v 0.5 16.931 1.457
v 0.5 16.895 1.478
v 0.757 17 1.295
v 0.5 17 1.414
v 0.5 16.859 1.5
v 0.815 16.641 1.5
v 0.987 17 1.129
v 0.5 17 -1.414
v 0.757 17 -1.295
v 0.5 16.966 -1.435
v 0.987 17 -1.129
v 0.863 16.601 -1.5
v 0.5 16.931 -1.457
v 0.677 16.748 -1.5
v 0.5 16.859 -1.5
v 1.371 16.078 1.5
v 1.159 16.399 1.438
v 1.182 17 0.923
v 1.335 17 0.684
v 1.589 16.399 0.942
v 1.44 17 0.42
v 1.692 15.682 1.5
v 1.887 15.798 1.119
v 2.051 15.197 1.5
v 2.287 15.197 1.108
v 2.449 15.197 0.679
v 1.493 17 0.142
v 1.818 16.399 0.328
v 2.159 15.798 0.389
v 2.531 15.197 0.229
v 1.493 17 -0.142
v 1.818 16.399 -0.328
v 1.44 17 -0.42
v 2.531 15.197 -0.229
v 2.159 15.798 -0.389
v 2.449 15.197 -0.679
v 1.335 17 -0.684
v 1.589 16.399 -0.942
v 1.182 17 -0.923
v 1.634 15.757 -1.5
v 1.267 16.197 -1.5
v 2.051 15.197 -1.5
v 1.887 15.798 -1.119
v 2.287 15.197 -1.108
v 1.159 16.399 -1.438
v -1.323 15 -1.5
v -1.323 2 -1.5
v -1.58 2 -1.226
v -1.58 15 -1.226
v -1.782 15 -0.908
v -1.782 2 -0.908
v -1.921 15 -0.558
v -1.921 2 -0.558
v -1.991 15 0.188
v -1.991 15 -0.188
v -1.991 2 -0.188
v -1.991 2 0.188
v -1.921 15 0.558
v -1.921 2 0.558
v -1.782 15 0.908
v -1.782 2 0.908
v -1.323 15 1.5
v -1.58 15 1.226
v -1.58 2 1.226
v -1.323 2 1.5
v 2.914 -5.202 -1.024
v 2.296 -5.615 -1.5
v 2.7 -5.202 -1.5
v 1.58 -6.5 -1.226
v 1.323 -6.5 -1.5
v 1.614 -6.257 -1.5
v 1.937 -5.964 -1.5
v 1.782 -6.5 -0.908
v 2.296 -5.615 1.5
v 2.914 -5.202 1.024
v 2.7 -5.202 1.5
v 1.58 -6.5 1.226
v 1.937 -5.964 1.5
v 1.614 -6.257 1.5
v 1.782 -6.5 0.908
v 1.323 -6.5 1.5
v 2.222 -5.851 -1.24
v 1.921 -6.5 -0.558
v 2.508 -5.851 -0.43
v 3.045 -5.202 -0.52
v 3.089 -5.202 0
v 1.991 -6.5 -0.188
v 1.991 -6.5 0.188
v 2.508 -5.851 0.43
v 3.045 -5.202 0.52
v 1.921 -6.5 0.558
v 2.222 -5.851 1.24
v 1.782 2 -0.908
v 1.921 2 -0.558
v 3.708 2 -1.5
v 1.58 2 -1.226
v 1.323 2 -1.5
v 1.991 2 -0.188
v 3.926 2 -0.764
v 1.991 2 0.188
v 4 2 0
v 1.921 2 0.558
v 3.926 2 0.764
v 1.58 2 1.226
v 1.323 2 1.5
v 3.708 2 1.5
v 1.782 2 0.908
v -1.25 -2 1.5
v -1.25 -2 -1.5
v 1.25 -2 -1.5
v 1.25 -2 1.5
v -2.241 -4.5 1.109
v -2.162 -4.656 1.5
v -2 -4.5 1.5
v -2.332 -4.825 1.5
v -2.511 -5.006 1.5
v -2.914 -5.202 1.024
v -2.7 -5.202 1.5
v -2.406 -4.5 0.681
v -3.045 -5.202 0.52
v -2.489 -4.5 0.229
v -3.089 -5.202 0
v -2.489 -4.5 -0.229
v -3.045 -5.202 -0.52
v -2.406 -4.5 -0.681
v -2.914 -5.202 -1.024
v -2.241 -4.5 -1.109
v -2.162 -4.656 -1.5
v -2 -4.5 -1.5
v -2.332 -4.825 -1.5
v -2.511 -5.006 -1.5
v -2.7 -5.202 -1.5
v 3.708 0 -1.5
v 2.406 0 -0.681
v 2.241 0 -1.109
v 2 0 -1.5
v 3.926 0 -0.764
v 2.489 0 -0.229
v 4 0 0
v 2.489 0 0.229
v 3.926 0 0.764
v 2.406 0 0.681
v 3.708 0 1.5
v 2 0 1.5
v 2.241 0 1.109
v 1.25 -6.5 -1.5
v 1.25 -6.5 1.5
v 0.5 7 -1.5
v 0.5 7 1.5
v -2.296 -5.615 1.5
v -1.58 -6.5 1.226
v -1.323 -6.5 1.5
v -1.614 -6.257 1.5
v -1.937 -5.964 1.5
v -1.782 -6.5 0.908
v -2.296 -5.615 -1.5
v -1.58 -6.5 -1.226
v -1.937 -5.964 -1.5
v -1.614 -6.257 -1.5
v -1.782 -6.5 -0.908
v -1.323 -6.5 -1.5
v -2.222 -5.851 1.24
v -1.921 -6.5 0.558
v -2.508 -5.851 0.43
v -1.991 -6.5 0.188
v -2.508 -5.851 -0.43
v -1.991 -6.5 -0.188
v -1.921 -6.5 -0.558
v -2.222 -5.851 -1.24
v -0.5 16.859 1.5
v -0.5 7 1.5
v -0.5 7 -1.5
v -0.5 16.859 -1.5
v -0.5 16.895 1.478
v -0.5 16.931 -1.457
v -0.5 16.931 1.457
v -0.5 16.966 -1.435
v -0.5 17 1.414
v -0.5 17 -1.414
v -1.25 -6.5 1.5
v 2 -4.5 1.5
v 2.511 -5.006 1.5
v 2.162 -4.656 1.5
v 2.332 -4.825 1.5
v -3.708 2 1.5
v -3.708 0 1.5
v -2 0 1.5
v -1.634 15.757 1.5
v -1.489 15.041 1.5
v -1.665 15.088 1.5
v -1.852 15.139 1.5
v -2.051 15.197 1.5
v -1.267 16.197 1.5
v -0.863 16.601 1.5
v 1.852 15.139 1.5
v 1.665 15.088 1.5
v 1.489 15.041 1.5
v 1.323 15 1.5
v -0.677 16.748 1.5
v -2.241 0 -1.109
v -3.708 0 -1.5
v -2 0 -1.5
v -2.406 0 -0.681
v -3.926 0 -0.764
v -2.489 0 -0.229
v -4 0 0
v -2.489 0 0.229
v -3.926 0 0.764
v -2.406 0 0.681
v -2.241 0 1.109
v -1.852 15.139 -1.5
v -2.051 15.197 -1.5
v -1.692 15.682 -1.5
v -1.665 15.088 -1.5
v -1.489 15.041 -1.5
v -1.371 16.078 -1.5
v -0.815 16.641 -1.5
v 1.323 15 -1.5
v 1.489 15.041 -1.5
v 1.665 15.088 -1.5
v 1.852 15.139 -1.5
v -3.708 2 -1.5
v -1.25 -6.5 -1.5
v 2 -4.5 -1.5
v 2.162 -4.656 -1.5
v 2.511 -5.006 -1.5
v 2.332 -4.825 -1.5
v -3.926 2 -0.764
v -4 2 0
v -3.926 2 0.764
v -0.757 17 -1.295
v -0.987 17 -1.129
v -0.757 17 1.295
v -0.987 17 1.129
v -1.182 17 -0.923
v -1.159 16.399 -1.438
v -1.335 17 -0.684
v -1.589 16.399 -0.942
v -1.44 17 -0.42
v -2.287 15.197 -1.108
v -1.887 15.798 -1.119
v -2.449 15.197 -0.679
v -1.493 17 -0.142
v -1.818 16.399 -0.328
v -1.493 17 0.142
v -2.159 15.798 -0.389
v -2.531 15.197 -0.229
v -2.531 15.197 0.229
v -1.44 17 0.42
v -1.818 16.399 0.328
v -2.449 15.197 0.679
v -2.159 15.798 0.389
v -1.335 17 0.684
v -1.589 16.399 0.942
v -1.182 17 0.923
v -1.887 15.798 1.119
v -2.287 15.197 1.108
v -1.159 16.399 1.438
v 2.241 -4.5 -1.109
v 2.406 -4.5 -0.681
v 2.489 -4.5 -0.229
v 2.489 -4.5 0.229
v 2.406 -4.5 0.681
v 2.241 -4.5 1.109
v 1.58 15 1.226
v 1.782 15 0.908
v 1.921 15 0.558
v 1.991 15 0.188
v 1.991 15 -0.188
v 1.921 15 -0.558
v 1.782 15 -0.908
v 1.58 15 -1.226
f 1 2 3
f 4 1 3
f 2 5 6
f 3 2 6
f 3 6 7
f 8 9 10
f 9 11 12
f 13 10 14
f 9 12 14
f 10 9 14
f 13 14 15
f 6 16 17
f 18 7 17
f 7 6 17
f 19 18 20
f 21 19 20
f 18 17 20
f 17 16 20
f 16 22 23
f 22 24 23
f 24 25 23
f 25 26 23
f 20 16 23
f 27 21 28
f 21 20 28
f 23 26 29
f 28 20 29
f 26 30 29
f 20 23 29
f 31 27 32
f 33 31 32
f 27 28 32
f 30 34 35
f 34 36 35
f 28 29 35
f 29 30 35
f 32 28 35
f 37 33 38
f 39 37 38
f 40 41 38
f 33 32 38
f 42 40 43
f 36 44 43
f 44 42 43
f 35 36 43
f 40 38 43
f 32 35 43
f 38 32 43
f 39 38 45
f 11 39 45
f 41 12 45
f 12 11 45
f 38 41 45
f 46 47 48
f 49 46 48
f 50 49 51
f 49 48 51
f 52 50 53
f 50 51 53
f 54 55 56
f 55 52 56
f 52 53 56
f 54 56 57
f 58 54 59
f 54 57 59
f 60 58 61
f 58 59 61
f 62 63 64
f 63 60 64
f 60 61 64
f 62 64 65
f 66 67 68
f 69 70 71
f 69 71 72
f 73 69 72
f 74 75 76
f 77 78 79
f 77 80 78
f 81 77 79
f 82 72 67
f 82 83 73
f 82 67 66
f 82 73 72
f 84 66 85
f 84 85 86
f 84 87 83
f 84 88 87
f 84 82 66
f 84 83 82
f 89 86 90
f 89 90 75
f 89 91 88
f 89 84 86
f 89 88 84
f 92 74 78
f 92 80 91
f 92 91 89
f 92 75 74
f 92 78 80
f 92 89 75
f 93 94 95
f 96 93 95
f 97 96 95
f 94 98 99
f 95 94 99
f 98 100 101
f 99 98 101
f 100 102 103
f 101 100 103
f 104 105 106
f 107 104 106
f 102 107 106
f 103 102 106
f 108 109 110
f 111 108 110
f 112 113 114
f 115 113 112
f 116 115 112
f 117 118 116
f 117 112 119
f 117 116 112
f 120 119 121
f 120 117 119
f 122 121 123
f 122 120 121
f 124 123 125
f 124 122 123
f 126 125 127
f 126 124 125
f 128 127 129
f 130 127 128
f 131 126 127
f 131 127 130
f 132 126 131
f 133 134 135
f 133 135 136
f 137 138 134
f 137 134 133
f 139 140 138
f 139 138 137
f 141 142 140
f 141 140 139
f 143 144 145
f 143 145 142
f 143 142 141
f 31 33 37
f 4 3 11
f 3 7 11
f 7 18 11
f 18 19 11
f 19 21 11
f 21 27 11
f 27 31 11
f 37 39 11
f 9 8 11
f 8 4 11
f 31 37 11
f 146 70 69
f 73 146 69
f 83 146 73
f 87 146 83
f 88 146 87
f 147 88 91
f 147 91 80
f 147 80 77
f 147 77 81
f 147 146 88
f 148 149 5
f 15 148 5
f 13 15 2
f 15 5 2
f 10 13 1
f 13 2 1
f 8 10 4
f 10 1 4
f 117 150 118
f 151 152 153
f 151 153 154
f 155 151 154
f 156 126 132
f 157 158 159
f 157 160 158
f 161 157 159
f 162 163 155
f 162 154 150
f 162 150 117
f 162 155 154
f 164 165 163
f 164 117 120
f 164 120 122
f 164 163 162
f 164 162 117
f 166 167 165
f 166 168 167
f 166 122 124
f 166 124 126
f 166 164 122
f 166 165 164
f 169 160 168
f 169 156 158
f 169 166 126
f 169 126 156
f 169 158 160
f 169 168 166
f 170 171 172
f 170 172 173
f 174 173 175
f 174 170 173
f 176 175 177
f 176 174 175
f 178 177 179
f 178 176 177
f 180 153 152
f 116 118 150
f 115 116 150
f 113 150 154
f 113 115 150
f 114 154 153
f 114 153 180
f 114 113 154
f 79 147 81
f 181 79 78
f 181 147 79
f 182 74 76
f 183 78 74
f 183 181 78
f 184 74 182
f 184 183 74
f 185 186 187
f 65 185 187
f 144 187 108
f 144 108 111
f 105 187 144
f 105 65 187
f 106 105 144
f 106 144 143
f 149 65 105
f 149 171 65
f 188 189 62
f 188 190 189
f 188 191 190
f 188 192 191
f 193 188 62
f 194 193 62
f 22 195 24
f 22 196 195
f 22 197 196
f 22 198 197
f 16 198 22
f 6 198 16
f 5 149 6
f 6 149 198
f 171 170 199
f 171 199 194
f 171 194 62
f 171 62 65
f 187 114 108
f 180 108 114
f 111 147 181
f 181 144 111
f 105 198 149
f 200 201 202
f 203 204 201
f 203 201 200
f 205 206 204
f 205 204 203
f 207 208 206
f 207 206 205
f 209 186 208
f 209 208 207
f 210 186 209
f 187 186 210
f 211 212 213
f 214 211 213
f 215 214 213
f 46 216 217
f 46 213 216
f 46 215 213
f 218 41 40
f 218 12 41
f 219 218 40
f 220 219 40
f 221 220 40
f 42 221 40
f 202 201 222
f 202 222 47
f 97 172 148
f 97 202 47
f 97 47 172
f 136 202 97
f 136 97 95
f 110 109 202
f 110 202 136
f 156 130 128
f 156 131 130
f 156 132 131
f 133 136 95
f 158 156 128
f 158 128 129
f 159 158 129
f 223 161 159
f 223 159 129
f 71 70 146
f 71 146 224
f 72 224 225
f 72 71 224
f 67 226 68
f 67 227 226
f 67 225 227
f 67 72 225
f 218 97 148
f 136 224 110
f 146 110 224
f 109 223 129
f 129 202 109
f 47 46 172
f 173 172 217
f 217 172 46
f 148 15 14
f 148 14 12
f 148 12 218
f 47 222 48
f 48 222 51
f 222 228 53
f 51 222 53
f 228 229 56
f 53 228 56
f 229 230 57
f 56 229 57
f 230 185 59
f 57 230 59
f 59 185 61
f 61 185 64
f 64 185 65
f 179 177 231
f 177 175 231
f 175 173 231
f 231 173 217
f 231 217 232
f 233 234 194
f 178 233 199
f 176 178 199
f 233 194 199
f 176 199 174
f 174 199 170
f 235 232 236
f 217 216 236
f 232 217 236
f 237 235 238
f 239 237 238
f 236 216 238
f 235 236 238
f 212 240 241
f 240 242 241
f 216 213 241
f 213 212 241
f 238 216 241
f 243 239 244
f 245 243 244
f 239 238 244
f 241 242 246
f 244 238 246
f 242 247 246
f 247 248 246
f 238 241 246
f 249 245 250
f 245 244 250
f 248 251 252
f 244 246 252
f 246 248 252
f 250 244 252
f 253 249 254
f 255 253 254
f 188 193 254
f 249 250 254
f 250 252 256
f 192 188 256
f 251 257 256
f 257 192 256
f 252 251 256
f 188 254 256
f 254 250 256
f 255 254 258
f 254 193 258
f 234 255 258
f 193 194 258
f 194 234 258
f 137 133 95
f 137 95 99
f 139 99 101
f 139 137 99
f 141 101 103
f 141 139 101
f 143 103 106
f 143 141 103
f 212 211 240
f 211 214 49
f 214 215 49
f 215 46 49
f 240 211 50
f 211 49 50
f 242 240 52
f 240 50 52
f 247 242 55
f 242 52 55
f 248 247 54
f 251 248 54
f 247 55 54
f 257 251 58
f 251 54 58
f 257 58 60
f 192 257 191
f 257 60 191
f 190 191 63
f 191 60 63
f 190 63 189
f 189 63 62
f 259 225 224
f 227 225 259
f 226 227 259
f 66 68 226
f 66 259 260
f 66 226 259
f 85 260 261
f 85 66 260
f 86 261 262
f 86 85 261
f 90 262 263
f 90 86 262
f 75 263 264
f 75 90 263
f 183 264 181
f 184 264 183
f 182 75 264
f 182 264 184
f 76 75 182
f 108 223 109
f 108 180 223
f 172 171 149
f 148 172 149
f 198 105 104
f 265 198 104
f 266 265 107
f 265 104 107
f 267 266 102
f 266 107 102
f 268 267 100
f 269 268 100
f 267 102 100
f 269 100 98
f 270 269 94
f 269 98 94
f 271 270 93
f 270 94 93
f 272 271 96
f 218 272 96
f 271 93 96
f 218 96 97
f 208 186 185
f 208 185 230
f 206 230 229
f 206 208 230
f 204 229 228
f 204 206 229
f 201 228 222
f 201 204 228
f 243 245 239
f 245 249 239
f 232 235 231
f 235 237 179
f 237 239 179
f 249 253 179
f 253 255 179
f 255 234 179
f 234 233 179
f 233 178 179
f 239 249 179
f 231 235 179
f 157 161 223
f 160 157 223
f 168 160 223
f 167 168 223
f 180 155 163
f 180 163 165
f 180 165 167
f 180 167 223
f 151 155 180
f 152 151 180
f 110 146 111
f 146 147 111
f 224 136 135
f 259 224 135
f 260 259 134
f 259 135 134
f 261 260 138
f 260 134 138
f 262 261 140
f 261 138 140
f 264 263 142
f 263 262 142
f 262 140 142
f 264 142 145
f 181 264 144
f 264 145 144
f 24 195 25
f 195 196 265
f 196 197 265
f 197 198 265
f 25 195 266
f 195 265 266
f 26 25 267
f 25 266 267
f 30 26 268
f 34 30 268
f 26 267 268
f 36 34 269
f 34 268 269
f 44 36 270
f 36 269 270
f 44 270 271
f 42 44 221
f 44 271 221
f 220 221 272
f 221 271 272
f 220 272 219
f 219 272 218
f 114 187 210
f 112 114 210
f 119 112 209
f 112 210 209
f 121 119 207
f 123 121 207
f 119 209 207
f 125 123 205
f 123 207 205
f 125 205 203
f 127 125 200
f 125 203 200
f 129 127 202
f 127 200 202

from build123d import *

# Parameters (mm, degrees)
F15_R     = 2.5
F0_DEPTH  = 4.5
F3_W      = 2.5
F3_H      = 7
F4_DEPTH  = 3.5
F5_R      = 4
F6_DEPTH  = 2
F7_R      = 2
F8_DEPTH  = 13
F11_W     = 1
F11_H     = 11
F12_DEPTH = 12.5
F13_W     = 11
F13_H     = 5
F14_DEPTH = 25


with BuildPart() as f0:
    # F15 (on Front) → F0 (new body)
    with BuildSketch(Plane.XZ):
        Circle(F15_R)
    extrude(amount=F0_DEPTH)

    # F1 (on Right) → F2 (revolve)
    with BuildSketch(Plane.YZ):
        Polygon((-6.5, 0), (-4.5, 0), (-4.5, 2.5), (-5.202062, 3.0891), (-6.5, 2), align=None)
    revolve(axis=Axis((0, -8.987078, 0), (0, -1, 0)))

    # F3 (on Top) → F4 (cut, symmetric)
    with BuildSketch(Plane.XY):
        with Locations((0, -5.5)):
            Rectangle(F3_W, F3_H)
    extrude(amount=F4_DEPTH, both=True, mode=Mode.SUBTRACT)

    # F5 (on face) → F6 (join)
    with BuildSketch(Plane.XZ):
        Circle(F5_R)
    extrude(amount=-F6_DEPTH)

    # F7 (on face) → F8 (join)
    with BuildSketch(Plane(origin=(0, 2, 0), x_dir=(-1, 0, 0), z_dir=(0, 1, 0))):
        Circle(F7_R)
    extrude(amount=F8_DEPTH)

    # F9 (on Right) → F10 (revolve)
    with BuildSketch(Plane.YZ):
        Polygon((15, 2), (15, 0), (17, 0), (17, 1.5), (15.196913, 2.541013), align=None)
    revolve(axis=Axis((0, 16, 0), (0, 1, 0)))

    # F11 (on Top) → F12 (cut, symmetric)
    with BuildSketch(Plane.XY):
        with Locations((0, 12.5)):
            Rectangle(F11_W, F11_H)
    extrude(amount=F12_DEPTH, both=True, mode=Mode.SUBTRACT)

    # F13 (on Front) → F14 (cut, symmetric)
    with BuildSketch(Plane.XZ):
        with Locations((0, 4)):
            Rectangle(F13_W, F13_H)
        with Locations((0, -4)):
            Rectangle(F13_W, F13_H)
    extrude(amount=F14_DEPTH, both=True, mode=Mode.SUBTRACT)


solid = f0.part
